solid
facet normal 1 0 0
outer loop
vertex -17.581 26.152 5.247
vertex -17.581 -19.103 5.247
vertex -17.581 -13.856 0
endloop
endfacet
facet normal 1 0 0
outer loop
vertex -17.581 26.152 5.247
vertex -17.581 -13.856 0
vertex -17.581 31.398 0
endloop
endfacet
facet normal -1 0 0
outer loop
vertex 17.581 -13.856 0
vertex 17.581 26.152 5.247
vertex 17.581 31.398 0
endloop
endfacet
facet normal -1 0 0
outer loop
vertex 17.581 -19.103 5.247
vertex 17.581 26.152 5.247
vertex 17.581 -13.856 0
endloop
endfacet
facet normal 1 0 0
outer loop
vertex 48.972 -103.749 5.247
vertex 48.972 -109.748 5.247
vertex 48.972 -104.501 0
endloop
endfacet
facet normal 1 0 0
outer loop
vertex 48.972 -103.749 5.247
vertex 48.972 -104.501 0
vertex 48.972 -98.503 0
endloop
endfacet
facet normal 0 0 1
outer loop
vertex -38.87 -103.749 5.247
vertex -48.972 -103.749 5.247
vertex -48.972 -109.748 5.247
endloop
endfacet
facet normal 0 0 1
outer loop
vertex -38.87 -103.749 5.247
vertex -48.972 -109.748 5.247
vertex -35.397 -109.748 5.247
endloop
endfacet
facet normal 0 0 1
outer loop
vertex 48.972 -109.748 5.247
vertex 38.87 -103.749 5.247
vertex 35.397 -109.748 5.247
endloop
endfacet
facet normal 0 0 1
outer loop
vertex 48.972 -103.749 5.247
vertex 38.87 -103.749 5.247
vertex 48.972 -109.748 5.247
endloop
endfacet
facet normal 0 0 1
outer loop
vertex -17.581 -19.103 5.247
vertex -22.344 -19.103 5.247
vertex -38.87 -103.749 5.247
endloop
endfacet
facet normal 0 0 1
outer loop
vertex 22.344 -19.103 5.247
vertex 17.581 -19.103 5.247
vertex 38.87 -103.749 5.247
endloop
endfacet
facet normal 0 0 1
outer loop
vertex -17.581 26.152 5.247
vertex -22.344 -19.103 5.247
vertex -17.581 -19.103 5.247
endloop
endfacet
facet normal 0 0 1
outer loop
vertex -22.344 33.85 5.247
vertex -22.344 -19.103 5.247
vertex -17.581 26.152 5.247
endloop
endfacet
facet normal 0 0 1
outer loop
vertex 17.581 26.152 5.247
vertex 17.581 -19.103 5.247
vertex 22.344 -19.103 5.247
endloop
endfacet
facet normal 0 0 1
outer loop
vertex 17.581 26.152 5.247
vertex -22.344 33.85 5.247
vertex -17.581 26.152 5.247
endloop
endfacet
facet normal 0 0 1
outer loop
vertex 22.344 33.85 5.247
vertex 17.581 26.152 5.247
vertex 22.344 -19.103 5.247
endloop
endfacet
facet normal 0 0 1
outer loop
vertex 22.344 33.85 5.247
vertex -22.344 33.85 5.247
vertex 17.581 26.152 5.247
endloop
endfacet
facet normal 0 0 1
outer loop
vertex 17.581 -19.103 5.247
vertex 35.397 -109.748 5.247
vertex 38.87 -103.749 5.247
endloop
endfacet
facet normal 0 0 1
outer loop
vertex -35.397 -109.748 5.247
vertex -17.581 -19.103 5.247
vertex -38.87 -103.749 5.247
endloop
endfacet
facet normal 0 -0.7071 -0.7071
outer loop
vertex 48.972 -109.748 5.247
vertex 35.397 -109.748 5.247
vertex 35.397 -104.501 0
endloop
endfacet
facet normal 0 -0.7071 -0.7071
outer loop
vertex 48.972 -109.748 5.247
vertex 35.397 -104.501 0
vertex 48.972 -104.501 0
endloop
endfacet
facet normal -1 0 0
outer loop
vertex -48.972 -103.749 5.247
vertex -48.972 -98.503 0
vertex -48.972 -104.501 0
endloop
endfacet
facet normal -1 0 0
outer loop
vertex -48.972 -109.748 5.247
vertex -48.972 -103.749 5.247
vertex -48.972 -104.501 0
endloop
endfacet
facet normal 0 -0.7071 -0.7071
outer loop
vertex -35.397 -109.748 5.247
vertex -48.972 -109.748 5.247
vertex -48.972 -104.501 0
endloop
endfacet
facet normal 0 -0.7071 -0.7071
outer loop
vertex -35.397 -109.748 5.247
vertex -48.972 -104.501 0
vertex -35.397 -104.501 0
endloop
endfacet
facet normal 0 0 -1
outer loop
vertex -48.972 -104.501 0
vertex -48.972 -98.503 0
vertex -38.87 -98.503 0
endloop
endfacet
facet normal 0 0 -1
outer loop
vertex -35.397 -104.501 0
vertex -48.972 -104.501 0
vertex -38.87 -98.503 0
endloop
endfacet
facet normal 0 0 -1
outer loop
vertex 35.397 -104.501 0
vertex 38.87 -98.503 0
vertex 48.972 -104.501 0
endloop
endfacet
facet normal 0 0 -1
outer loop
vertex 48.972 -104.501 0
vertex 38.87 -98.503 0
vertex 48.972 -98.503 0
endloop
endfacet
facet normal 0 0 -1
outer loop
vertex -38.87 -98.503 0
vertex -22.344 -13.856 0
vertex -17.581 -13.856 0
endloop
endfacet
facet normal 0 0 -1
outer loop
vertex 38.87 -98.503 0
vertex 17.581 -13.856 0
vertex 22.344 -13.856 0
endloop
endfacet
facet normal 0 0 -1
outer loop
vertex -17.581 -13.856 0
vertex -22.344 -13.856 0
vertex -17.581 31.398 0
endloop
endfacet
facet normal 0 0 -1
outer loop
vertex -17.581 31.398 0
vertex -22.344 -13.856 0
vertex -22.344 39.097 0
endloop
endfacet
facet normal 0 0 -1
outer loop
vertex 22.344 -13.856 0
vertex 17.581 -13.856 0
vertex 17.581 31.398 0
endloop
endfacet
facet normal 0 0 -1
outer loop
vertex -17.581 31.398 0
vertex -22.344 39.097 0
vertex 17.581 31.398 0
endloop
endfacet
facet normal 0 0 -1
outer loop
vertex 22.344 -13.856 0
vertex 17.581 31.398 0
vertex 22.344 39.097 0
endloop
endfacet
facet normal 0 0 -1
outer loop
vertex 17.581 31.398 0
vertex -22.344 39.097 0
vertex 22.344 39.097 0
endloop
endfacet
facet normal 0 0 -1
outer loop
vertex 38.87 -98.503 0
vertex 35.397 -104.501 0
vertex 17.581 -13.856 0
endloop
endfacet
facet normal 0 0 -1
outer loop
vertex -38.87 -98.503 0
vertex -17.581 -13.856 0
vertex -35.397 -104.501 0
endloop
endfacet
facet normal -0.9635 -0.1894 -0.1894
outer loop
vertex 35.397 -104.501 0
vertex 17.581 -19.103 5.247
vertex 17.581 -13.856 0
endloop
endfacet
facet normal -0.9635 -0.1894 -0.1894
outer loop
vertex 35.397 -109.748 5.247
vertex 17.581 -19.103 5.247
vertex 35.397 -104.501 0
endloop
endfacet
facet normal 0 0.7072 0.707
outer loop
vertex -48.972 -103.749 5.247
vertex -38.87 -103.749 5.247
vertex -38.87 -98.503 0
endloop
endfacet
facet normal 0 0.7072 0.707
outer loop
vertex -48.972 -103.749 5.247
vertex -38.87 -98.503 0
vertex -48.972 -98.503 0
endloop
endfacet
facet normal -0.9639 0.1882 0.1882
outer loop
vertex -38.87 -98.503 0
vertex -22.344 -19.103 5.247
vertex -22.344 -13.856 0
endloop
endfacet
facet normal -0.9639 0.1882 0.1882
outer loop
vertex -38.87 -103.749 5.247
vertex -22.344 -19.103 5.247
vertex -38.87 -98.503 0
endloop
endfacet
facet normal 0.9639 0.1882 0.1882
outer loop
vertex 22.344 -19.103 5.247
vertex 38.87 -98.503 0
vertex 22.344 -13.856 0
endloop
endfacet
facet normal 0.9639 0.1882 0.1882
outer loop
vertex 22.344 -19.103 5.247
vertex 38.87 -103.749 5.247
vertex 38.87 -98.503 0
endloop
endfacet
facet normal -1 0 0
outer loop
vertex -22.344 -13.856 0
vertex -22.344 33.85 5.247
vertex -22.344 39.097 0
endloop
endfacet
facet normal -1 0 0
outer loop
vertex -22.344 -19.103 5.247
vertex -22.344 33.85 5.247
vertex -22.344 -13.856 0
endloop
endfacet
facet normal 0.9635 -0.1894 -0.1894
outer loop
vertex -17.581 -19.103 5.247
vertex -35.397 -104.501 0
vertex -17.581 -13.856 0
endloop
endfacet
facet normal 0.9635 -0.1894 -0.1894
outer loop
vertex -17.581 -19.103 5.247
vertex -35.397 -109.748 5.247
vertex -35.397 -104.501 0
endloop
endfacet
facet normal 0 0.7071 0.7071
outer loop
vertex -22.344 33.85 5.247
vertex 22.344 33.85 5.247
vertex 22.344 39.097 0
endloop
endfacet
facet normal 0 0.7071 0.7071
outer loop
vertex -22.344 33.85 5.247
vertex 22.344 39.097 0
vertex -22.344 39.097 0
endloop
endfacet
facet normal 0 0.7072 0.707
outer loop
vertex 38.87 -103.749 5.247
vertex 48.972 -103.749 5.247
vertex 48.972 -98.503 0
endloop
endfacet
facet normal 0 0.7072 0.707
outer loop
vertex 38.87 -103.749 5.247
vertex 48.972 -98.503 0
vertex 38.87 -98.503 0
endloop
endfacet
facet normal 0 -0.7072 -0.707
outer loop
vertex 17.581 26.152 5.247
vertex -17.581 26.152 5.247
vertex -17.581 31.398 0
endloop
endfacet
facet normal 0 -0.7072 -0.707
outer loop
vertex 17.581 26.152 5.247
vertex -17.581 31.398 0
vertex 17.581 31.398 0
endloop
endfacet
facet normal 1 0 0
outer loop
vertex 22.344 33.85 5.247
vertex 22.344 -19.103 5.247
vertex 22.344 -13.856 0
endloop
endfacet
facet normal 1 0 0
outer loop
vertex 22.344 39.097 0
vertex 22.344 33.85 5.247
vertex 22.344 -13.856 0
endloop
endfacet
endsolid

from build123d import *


with BuildPart() as f2:
    # F2: sweep along a path in F1
    with BuildLine(Plane.YZ) as f2_path:
        Line((0, 0), (-5.2465468888, 5.2465468888))
    # F0 (on Top) → F2 (sweep)
    with BuildSketch(Plane.XY):
        Polygon((-17.5813417882, -13.8564798981), (-17.5813417882, 31.3983540978), (17.5813417882, 31.3983540978), (17.5813417882, -13.8564798981), (35.3969819844, -104.5009791851), (38.8697721064, -104.5009791851), (48.9724315703, -104.5009791851), (48.9724315703, -98.5025316477), (38.8697721064, -98.5025316477), (22.3438417882, -13.8564798981), (22.3438417882, 39.0965069434), (0, 39.0965069434), (-22.3438417882, 39.0965069434), (-22.3438417882, -13.8564798981), (-38.8697721064, -98.5025316477), (-48.9724315703, -98.5025316477), (-48.9724315703, -104.5009791851), (-38.8697721064, -104.5009791851), (-35.3969819844, -104.5009791851), align=None)
    sweep(path=f2_path.line)


solid = f2.part
